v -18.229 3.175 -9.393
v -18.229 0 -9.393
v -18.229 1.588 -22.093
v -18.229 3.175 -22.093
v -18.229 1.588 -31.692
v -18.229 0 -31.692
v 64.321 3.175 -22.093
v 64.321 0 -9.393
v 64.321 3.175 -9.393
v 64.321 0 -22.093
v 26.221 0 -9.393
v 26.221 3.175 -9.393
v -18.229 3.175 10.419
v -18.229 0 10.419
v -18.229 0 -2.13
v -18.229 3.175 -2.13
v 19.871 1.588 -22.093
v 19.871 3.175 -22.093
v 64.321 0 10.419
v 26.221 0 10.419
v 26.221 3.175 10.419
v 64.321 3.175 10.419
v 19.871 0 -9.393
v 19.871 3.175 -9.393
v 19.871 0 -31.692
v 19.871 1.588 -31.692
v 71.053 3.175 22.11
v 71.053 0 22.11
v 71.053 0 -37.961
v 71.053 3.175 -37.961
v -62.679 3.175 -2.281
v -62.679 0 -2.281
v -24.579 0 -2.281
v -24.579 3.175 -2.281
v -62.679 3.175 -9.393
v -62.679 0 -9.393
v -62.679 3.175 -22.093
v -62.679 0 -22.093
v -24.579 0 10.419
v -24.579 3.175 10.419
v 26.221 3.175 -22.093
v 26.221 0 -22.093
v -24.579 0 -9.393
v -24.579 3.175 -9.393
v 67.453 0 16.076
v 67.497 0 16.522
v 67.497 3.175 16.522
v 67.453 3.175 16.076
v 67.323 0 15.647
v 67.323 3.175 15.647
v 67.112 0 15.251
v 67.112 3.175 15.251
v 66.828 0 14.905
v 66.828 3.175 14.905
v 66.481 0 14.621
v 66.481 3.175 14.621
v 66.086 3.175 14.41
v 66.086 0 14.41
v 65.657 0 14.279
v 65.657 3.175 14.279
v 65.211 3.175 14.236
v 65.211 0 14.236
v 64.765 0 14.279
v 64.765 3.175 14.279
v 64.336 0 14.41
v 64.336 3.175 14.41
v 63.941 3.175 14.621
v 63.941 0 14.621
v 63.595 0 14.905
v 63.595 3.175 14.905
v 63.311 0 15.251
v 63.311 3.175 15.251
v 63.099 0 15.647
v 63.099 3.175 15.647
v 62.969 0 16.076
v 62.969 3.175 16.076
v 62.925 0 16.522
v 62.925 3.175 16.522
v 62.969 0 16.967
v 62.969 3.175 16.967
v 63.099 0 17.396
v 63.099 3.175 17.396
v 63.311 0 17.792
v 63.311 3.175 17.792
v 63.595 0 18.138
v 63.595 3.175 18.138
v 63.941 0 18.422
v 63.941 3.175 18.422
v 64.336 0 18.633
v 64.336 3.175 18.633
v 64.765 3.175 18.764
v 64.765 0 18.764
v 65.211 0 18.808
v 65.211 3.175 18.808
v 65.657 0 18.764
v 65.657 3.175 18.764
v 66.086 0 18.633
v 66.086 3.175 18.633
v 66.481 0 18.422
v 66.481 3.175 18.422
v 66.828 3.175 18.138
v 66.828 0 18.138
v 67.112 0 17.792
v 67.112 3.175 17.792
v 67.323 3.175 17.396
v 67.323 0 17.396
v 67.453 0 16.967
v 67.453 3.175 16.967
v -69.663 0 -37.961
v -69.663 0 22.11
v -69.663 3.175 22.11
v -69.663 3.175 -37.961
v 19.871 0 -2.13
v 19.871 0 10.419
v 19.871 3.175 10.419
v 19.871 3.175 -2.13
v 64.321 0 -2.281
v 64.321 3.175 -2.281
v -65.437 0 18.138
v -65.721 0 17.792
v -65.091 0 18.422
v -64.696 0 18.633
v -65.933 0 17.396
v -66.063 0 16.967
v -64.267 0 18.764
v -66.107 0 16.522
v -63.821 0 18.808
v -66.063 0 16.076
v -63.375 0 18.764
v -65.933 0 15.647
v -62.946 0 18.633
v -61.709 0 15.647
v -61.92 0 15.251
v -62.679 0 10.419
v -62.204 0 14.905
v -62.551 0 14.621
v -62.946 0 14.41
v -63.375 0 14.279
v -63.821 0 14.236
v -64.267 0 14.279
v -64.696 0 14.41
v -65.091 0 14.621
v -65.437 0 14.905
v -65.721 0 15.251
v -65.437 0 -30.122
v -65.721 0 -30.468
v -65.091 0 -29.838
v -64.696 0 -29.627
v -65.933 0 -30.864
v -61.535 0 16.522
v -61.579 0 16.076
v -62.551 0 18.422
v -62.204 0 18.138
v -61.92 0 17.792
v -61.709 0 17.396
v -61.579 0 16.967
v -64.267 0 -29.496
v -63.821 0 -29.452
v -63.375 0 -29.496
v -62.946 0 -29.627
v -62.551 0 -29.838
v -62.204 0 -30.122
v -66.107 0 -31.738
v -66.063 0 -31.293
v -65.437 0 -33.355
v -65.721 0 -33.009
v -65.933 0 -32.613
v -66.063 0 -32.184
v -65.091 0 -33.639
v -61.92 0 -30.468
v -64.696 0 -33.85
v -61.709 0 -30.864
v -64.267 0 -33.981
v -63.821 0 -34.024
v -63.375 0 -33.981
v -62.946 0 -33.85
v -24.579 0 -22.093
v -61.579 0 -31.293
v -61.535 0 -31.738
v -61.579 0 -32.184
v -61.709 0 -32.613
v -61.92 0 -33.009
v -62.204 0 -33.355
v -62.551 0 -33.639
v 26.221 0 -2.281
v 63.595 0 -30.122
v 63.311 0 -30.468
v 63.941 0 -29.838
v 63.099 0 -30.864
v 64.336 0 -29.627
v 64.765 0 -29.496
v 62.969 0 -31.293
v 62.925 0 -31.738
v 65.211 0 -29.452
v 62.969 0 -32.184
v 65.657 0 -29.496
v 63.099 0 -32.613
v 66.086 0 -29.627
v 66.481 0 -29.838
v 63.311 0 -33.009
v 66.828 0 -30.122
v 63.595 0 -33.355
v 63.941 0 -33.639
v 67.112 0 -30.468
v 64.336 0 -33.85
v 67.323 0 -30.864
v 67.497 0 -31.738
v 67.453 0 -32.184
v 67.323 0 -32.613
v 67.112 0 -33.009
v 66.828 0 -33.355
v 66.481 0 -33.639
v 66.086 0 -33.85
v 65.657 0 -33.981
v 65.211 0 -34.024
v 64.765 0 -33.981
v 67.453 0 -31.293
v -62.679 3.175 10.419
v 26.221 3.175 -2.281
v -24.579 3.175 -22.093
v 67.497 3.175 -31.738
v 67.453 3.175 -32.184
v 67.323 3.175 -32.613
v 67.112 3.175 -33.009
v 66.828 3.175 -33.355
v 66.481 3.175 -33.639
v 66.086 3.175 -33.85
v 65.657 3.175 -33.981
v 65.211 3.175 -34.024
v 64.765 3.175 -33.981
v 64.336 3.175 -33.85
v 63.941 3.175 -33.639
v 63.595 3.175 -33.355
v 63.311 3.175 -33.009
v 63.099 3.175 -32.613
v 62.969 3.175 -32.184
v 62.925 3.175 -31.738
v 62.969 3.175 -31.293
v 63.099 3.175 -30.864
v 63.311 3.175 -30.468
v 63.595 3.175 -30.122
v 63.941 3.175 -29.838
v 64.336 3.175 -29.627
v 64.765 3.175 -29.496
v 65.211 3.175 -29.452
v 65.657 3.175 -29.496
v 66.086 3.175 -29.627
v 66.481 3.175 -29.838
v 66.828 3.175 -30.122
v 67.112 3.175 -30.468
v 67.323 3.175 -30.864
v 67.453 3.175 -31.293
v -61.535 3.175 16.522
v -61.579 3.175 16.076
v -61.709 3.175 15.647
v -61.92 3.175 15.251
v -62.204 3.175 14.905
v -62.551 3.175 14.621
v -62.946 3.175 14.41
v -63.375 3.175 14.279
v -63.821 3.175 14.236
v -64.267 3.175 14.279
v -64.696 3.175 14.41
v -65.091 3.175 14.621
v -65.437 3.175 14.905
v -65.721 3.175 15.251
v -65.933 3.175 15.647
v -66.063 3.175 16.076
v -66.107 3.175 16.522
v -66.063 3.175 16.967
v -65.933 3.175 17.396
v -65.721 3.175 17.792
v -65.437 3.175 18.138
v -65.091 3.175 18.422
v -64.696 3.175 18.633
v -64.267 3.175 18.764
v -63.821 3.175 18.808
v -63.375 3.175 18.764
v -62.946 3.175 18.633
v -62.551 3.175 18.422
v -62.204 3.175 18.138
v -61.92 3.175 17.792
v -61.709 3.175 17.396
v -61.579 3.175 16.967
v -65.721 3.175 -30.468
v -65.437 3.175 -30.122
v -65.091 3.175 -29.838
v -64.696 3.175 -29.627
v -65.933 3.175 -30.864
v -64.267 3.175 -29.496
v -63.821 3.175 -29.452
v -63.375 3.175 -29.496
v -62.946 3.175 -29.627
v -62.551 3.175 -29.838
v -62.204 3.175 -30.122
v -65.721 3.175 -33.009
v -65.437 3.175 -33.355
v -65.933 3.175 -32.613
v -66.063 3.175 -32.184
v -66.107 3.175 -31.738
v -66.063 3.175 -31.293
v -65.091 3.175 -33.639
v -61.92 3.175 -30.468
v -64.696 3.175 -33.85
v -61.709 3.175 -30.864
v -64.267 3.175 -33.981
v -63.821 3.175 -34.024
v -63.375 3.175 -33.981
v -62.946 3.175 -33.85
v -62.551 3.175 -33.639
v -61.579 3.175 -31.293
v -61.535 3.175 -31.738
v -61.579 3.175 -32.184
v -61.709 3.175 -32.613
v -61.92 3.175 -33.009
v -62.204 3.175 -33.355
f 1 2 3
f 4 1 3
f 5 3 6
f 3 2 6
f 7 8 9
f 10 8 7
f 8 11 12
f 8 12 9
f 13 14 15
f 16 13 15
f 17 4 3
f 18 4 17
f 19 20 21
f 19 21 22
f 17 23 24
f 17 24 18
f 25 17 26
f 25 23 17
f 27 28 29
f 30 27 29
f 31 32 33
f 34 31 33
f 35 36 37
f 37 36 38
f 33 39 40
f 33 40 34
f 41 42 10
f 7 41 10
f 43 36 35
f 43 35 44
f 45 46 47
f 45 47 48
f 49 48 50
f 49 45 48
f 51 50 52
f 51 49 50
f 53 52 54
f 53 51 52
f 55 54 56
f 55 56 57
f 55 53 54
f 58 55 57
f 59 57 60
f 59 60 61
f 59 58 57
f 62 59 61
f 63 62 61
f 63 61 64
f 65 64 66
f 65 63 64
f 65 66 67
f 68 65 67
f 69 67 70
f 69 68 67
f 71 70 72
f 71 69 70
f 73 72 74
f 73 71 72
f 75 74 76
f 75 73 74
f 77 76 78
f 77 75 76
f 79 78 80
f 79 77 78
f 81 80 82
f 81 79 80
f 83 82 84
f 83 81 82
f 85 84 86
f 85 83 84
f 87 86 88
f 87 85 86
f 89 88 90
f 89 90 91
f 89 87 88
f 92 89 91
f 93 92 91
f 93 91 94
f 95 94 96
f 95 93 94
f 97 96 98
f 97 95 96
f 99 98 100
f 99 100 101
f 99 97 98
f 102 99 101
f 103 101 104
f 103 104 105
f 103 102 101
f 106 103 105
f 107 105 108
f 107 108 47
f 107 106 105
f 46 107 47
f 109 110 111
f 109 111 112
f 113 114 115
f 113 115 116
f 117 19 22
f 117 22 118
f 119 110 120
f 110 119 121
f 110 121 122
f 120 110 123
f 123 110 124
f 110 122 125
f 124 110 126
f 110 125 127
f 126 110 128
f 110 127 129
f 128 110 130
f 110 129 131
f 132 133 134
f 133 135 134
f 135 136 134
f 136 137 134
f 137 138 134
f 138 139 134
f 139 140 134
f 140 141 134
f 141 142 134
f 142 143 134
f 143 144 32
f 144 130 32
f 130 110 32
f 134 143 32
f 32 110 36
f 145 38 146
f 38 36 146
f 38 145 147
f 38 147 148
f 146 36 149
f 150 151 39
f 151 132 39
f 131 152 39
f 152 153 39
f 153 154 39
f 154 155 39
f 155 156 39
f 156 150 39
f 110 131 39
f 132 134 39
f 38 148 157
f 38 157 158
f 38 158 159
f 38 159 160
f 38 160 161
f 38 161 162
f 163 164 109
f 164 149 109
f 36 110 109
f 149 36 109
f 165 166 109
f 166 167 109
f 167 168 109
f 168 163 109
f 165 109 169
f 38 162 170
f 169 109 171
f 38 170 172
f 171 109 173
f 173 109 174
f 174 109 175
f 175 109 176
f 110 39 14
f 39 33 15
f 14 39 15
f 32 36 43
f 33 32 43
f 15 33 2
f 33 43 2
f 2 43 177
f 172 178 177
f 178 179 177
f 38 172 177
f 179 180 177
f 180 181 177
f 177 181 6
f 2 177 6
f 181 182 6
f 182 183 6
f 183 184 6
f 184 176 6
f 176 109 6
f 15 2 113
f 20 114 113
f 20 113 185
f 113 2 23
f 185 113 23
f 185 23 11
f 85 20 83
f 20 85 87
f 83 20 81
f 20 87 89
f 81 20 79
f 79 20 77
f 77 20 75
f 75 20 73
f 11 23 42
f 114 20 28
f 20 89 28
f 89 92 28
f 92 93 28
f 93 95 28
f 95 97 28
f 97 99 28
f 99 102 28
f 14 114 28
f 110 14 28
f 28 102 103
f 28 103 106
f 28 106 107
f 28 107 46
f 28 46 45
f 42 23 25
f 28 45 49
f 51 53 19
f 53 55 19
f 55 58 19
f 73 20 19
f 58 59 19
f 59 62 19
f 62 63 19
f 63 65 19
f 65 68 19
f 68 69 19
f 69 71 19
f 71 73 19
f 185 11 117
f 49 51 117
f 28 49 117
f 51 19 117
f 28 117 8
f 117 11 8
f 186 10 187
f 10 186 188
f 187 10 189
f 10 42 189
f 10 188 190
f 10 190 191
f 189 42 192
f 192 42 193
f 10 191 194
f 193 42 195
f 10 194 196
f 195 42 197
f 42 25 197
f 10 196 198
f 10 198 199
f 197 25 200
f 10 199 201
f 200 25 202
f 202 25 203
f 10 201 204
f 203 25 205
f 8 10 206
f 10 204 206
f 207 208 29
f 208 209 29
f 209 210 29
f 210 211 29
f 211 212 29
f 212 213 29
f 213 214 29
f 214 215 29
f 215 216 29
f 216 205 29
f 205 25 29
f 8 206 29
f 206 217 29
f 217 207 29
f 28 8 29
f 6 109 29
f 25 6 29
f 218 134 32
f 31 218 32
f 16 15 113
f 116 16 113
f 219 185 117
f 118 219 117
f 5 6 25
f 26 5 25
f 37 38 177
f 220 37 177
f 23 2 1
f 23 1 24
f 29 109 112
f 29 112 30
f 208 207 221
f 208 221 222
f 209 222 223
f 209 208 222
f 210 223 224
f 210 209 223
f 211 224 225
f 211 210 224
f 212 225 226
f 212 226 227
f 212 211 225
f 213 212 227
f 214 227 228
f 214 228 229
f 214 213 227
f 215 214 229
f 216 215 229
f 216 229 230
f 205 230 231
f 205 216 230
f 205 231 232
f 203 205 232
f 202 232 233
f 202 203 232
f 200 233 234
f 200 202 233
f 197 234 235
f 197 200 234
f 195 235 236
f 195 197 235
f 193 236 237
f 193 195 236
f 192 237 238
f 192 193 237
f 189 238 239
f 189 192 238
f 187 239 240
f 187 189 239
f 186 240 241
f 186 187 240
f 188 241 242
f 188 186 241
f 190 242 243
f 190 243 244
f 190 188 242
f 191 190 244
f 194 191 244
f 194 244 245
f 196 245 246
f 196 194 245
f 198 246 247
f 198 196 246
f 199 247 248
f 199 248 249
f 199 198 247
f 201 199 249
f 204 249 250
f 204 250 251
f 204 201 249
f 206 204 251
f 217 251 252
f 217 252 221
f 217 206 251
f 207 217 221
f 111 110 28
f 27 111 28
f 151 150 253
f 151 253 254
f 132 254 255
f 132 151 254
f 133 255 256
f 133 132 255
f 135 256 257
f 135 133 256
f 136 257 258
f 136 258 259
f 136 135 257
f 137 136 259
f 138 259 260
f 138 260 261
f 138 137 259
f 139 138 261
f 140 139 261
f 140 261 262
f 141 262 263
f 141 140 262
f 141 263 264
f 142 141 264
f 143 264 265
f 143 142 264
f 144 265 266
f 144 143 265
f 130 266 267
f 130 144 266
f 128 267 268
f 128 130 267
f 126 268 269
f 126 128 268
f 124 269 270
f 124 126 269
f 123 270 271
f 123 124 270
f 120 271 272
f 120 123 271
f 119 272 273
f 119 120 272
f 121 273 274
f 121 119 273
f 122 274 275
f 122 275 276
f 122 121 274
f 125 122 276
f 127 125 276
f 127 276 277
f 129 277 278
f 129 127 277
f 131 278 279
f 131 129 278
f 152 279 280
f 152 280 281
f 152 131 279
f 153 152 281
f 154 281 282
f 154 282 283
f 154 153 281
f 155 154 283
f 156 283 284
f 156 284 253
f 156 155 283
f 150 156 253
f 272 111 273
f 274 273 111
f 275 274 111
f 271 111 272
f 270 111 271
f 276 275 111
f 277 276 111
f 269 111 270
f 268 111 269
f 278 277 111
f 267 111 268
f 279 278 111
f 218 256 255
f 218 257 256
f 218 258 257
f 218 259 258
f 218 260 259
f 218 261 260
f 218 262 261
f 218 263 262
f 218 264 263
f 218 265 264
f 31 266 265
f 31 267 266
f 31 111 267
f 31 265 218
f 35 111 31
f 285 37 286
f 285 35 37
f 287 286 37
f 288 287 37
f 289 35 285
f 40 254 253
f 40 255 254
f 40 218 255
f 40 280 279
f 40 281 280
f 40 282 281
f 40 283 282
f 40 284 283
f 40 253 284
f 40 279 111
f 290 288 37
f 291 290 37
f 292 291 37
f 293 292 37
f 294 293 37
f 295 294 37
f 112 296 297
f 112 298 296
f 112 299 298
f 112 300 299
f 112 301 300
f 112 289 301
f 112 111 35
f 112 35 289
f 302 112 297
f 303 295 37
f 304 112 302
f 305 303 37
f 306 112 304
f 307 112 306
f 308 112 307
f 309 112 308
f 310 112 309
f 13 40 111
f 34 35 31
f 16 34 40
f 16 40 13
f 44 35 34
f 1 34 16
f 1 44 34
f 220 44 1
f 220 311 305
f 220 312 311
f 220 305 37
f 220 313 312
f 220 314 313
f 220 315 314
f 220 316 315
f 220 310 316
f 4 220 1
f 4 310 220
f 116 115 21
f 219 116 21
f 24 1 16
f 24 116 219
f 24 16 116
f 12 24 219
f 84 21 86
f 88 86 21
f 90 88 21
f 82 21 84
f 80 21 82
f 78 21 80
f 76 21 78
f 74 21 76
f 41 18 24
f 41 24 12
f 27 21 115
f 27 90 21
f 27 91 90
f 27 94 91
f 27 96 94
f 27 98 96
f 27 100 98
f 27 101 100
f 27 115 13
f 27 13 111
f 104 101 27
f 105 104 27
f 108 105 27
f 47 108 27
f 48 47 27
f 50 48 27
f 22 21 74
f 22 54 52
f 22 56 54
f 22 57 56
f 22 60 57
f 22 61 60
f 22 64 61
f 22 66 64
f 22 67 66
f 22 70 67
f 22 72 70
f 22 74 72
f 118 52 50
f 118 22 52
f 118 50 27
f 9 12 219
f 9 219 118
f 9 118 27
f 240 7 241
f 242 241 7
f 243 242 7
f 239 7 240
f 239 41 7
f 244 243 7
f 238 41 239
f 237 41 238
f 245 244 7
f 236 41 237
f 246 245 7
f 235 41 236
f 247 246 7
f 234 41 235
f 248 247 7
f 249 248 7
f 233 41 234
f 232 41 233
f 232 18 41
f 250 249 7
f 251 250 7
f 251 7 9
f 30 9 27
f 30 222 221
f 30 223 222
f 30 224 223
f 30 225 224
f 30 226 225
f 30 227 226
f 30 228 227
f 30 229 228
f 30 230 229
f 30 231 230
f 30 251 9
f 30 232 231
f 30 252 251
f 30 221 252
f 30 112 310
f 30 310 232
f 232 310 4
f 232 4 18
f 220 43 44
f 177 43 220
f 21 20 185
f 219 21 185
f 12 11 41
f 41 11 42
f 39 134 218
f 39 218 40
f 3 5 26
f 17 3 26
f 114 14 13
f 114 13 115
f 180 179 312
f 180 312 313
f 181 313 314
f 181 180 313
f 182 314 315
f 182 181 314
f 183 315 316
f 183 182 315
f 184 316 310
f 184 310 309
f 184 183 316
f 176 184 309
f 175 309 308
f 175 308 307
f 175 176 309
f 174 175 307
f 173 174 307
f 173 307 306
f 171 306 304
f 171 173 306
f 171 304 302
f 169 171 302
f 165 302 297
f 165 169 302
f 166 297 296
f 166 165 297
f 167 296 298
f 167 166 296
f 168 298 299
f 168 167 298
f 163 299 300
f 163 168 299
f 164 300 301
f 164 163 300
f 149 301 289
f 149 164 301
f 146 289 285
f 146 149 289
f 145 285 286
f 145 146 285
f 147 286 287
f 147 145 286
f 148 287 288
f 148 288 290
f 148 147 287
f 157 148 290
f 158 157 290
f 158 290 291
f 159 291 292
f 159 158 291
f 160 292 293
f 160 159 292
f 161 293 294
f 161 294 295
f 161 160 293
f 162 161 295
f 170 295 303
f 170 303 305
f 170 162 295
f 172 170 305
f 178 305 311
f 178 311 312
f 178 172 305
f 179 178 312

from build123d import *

# Parameters (mm, degrees)
SKETCH3_W           = 140.715997696
SKETCH3_H           = 60.070999146
SKETCH3_R           = 2.286
SKETCH3_W_2         = 38.1
SKETCH3_H_2         = 12.7
SKETCH3_H_3         = 12.548758089
SKETCH3_H_4         = 22.298299906
BOSS_EXTRUDE1_DEPTH = 3.175
SKETCH4_W           = 38.1
SKETCH4_H           = 9.598299906
BOSS_EXTRUDE2_DEPTH = 1.5875


with BuildPart() as part:
    # Sketch3 → Boss-Extrude1 (new body)
    with BuildSketch(Plane(origin=(0, 0, 0), x_dir=(1, 0, 0), z_dir=(0, 1, 0))):
        with Locations((0.695262938, 7.925997488)):
            Rectangle(SKETCH3_W, SKETCH3_H)
        with Locations((65.211264471, -16.521503733)):
            Circle(SKETCH3_R, mode=Mode.SUBTRACT)
        with Locations((45.270791396, -4.068621014)):
            Rectangle(SKETCH3_W_2, SKETCH3_H_2, mode=Mode.SUBTRACT)
        with Locations((45.270791396, 15.743378986)):
            Rectangle(SKETCH3_W_2, SKETCH3_H_2, mode=Mode.SUBTRACT)
        with Locations((0.820791396, -4.14424197)):
            Rectangle(SKETCH3_W_2, SKETCH3_H_3, mode=Mode.SUBTRACT)
        with Locations((0.820791396, 20.542528939)):
            Rectangle(SKETCH3_W_2, SKETCH3_H_4, mode=Mode.SUBTRACT)
        with Locations((-63.820735529, -16.521503733)):
            Circle(SKETCH3_R, mode=Mode.SUBTRACT)
        with Locations((-43.629208604, -4.068621014)):
            Rectangle(SKETCH3_W_2, SKETCH3_H_2, mode=Mode.SUBTRACT)
        with Locations((-43.629208604, 15.743378986)):
            Rectangle(SKETCH3_W_2, SKETCH3_H_2, mode=Mode.SUBTRACT)
        with Locations((-63.820735529, 31.738496267)):
            Circle(SKETCH3_R, mode=Mode.SUBTRACT)
        with Locations((65.211264471, 31.738496267)):
            Circle(SKETCH3_R, mode=Mode.SUBTRACT)
    extrude(amount=BOSS_EXTRUDE1_DEPTH)

    # Sketch4 → Boss-Extrude2 (add)
    with BuildSketch(Plane(origin=(0, 3.175, 0), x_dir=(1, 0, 0), z_dir=(0, 1, 0))):
        with Locations((0.820791396, 26.892528939)):
            Rectangle(SKETCH4_W, SKETCH4_H)
    extrude(amount=-BOSS_EXTRUDE2_DEPTH)


solid = part.part
